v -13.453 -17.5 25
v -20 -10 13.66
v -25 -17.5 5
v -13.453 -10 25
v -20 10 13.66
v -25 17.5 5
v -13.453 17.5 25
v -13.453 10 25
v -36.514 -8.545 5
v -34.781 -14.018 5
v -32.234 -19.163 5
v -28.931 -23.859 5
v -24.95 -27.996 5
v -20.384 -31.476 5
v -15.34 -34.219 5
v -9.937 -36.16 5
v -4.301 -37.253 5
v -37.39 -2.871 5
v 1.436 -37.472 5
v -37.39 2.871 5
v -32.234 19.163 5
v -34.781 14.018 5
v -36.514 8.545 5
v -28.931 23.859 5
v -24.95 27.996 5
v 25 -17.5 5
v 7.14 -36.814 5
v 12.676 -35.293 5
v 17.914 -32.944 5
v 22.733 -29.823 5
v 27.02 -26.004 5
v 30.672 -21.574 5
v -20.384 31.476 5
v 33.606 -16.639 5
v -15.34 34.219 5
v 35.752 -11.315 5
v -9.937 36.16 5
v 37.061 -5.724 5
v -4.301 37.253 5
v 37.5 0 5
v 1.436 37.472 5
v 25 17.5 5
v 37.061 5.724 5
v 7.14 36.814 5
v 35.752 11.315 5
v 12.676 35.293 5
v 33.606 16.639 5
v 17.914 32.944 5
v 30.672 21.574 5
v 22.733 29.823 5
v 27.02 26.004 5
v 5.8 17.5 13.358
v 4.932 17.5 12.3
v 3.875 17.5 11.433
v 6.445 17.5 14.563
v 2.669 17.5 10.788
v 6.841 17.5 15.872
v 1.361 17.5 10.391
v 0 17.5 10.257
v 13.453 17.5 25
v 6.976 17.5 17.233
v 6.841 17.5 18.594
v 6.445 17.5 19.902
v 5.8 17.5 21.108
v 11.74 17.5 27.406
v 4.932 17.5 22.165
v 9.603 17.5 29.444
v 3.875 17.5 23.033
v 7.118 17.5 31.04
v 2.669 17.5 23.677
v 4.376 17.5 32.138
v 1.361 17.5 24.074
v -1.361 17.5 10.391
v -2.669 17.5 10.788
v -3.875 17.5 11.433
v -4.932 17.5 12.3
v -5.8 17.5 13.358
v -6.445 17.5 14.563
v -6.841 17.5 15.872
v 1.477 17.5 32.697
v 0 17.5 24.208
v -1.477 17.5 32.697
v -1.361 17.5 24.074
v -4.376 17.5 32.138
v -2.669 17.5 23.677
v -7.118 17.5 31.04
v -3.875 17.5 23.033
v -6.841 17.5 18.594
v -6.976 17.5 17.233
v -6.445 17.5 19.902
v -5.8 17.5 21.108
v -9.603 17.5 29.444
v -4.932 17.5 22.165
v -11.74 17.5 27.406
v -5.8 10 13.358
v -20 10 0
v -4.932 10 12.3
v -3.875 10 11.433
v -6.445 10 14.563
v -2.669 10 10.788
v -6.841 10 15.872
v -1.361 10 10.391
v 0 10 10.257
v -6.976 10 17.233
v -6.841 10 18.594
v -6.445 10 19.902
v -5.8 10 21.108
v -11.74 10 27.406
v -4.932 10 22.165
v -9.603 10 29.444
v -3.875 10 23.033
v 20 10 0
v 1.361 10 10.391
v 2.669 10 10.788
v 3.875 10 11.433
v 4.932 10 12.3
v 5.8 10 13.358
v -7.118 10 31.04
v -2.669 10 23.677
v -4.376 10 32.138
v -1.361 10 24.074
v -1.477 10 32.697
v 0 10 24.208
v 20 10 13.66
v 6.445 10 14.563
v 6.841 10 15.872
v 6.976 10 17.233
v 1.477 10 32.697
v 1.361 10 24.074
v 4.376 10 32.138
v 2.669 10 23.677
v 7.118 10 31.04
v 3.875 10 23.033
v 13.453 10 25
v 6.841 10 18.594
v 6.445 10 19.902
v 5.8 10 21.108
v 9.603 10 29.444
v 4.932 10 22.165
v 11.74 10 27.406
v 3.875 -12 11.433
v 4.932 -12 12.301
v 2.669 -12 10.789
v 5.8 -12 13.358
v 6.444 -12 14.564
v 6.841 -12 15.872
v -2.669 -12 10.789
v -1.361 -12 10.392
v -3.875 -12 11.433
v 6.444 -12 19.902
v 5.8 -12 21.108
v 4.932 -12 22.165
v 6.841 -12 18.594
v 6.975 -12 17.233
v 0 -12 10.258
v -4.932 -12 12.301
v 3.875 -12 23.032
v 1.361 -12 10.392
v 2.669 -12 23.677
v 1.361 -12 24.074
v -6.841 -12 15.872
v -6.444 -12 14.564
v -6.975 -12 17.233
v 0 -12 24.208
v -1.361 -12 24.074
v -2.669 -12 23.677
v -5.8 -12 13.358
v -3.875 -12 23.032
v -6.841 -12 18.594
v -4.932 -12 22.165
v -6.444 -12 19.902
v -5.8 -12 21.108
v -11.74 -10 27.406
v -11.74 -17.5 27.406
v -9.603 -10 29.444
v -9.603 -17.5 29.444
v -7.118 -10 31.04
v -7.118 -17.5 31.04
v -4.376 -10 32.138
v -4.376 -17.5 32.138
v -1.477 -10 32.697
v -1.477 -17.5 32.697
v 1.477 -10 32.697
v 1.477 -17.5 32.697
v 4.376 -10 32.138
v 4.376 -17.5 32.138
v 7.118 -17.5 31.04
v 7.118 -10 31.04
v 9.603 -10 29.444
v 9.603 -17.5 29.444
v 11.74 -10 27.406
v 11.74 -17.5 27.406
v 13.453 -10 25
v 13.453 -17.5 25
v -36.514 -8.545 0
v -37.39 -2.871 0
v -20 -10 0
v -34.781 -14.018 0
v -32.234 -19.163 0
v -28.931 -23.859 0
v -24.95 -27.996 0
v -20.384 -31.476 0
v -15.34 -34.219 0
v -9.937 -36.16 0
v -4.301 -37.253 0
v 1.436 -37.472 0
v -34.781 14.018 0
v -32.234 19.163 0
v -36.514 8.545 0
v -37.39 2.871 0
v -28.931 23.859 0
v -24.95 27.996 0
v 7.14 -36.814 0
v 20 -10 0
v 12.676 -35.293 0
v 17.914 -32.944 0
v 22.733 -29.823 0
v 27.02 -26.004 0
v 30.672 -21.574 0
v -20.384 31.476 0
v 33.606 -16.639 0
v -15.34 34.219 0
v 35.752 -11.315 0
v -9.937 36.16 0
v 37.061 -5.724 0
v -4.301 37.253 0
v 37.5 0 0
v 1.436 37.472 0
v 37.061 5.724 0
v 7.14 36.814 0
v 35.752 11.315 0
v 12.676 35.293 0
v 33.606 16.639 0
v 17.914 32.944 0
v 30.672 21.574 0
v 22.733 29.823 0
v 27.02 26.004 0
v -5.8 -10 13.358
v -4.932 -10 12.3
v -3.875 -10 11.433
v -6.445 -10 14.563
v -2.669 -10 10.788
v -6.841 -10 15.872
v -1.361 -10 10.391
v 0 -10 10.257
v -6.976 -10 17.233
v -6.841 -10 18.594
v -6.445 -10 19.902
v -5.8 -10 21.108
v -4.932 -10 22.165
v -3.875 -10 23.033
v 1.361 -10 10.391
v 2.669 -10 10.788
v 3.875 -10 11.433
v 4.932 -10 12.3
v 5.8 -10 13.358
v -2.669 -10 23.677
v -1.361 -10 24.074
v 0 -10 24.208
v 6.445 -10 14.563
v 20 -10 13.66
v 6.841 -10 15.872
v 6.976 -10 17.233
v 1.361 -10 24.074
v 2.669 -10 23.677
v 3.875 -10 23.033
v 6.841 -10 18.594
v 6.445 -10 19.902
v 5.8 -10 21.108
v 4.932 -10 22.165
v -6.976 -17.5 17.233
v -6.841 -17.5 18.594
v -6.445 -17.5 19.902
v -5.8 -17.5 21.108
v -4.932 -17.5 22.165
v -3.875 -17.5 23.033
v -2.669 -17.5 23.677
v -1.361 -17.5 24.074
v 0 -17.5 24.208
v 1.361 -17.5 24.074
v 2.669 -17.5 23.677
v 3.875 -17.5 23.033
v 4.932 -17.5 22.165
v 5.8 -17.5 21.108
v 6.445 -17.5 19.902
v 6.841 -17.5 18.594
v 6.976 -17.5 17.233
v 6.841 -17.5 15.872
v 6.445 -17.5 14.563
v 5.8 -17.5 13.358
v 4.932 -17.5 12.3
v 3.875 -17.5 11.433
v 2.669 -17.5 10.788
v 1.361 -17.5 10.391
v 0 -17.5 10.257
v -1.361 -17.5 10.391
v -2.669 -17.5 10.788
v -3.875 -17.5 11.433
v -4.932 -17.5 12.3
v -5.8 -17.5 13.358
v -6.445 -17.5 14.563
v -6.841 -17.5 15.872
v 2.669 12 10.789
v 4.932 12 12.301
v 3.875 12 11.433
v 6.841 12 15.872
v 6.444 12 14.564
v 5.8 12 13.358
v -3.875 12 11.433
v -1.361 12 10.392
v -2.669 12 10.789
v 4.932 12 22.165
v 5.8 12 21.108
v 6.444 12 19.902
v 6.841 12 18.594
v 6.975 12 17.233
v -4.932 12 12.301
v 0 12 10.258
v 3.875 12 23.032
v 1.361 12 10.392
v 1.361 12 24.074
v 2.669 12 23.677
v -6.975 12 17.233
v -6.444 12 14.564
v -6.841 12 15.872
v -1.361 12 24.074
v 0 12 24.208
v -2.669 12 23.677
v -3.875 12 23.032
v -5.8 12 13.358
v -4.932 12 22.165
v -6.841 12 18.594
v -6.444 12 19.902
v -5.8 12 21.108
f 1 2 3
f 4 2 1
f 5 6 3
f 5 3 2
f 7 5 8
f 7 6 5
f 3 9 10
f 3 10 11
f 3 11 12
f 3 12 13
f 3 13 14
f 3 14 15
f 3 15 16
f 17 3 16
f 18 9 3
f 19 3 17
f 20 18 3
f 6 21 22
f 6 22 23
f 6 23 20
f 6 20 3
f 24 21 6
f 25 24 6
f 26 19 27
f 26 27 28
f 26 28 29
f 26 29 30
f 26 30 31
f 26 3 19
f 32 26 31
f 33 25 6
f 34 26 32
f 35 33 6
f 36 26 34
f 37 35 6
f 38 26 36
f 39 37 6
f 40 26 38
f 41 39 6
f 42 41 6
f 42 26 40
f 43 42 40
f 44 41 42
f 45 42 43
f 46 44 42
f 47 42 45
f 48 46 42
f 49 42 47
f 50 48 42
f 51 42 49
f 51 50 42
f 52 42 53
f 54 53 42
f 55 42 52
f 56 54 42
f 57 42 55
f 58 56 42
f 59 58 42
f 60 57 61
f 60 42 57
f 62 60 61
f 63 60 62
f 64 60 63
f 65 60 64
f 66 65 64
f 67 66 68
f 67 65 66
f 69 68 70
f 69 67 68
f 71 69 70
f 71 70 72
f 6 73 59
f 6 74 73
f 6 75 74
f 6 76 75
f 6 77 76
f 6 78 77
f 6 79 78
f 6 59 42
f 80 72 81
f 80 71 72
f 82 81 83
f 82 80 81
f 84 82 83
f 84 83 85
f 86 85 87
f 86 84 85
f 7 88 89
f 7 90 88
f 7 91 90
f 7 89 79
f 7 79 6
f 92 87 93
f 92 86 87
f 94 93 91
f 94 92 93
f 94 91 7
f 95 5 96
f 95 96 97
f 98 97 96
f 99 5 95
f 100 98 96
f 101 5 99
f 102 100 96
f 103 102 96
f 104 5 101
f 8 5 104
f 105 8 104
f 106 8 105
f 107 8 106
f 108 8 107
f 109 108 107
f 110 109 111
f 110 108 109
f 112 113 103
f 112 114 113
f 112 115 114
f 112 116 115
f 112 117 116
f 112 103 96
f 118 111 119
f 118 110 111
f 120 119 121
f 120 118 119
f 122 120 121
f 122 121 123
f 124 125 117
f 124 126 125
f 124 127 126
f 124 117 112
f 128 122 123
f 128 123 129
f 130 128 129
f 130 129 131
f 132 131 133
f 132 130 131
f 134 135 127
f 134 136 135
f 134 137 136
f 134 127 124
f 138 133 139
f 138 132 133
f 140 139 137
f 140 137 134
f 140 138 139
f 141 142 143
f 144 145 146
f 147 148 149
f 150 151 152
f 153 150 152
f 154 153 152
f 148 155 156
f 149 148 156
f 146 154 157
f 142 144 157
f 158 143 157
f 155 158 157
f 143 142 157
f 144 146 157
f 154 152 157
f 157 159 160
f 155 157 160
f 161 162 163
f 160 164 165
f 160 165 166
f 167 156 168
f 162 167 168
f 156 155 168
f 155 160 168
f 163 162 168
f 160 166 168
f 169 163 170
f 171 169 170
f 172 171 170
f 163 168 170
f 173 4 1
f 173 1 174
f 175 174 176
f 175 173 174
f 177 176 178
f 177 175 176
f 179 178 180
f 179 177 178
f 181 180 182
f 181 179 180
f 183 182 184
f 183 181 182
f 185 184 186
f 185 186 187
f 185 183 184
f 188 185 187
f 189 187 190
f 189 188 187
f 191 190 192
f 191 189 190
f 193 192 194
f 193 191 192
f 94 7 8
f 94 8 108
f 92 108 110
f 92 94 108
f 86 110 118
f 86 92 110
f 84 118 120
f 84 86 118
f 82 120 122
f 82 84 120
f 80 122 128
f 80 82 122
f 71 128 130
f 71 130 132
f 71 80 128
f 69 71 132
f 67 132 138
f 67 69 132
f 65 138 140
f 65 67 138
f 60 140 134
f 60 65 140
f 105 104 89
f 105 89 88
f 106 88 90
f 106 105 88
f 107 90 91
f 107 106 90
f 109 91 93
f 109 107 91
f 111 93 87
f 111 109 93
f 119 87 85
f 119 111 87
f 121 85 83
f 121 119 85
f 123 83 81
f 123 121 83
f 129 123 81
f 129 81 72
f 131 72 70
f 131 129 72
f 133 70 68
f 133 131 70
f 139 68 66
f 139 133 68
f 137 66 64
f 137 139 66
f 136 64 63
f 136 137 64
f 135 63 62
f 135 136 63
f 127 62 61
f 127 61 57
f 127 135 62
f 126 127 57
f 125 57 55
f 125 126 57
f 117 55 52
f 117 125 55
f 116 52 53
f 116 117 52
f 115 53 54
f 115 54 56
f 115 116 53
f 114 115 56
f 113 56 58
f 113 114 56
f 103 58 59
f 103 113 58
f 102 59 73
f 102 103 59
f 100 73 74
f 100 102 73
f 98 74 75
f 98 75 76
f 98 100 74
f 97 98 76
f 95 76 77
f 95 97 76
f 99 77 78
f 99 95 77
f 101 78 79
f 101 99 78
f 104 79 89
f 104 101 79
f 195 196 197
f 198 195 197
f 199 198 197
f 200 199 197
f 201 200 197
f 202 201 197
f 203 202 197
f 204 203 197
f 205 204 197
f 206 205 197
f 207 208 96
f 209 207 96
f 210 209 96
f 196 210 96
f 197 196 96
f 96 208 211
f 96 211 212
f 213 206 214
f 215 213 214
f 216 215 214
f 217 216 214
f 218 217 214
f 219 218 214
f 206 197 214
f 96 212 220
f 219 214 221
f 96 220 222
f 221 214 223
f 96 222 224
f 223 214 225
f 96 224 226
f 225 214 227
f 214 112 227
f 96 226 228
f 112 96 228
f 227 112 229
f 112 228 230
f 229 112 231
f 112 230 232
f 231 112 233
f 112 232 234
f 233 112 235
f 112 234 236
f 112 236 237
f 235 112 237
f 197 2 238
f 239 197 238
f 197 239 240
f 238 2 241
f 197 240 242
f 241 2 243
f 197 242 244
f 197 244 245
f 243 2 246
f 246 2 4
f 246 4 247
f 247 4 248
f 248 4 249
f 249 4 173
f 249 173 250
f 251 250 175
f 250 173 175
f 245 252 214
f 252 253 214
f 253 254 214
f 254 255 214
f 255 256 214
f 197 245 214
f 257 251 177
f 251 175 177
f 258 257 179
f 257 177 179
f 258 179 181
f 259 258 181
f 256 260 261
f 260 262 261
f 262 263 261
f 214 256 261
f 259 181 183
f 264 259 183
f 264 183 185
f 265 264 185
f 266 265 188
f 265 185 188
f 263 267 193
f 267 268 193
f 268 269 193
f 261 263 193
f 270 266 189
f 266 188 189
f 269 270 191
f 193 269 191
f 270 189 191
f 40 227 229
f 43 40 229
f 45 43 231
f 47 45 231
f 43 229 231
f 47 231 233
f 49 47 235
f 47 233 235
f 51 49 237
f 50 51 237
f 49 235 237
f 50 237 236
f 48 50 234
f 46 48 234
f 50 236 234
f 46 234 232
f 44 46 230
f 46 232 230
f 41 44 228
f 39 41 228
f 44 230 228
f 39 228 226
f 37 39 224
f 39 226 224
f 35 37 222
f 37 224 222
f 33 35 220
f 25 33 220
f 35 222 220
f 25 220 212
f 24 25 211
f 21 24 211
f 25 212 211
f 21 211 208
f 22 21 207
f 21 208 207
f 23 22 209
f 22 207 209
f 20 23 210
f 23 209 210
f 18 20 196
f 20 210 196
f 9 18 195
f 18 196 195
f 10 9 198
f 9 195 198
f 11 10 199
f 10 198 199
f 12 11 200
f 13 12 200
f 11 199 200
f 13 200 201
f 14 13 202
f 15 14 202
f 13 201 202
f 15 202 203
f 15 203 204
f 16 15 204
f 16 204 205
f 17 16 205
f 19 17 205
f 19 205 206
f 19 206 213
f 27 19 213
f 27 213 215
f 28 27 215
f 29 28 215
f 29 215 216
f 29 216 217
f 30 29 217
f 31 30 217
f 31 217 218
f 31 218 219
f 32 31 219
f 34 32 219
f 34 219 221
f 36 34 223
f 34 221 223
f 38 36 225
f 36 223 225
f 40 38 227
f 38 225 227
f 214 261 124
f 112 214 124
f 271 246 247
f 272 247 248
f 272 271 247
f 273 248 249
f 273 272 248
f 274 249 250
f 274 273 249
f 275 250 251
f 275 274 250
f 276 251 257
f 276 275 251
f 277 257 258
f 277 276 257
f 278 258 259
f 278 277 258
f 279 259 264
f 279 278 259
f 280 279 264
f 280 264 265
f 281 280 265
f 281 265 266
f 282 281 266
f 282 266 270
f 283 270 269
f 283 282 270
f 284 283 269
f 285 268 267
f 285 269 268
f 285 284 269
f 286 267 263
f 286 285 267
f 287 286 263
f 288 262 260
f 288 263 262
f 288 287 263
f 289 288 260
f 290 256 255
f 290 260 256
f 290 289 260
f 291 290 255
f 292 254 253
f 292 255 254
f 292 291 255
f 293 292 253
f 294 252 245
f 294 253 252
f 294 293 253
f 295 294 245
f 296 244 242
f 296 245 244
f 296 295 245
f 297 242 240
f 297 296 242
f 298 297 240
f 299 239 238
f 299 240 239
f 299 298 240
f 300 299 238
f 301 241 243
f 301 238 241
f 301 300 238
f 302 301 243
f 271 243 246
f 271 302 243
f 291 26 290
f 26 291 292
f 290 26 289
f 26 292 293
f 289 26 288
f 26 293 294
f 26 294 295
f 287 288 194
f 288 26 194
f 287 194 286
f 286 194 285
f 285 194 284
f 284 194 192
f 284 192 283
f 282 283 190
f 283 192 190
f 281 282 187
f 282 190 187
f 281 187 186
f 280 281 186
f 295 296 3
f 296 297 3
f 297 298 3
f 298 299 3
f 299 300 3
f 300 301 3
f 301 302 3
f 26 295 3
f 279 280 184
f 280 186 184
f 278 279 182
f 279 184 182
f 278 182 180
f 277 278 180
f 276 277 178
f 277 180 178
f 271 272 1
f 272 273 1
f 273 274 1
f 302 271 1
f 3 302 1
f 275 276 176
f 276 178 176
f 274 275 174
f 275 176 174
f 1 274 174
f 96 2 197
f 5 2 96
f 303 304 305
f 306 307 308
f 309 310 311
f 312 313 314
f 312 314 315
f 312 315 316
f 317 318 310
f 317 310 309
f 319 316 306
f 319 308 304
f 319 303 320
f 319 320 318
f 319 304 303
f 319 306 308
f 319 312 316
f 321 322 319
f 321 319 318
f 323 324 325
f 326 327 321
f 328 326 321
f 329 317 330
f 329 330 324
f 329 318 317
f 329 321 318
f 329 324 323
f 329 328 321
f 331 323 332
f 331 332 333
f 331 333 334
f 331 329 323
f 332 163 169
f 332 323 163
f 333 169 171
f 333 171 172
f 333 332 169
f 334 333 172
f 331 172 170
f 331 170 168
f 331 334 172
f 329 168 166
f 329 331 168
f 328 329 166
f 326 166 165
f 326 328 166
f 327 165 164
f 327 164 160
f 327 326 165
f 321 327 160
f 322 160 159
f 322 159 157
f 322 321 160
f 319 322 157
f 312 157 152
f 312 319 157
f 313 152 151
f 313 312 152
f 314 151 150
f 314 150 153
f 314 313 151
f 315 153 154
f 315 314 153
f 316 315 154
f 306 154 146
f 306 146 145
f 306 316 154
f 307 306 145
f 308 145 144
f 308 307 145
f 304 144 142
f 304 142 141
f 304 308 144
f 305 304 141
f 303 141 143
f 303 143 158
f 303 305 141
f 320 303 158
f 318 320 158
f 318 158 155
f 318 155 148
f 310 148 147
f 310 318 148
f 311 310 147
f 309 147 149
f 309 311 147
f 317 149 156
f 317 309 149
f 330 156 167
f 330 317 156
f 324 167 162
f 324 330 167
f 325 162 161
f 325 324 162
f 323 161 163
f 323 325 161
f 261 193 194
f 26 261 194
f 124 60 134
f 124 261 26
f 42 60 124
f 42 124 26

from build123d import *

# Parameters (mm, degrees)
SKETCH2_R               = 37.5
EXTRUDE1_DEPTH          = 5
SKETCH4_R               = 6.975515666
EXTRUDE2_DEPTH          = 17.5
SKETCH5_W               = 40
SKETCH5_H               = 20
CUT_EXTRUDE3_DEPTH      = 28.767090063
CUT_EXTRUDE3_DEPTH_BACK = 6
SKETCH6_R               = 6.975
EXTRUDE3_DEPTH          = 22
EXTRUDE3_DEPTH_BACK     = 2


with BuildPart() as part:
    # Sketch2 → Extrude1 (new body)
    with BuildSketch(Plane.XY):
        Circle(SKETCH2_R)
    extrude(amount=EXTRUDE1_DEPTH)

    # Sketch4 → Extrude2 (add, symmetric)
    with BuildSketch(Plane(origin=(0, 0, 0), x_dir=(-1, 0, 0), z_dir=(0, 1, 0))):
        with BuildLine():
            Line((-25, 5), (25, 5))
            Line((25, 5), (13.452994616, 25))
            ThreePointArc((13.452994616, 25), (0, 32.767090063), (-13.452994616, 25))
            Line((-13.452994616, 25), (-25, 5))
        make_face()
        with Locations((0, 17.232909937)):
            Circle(SKETCH4_R, mode=Mode.SUBTRACT)
    extrude(amount=EXTRUDE2_DEPTH, both=True)

    # Sketch5 → Cut-Extrude3 (cut, two sides)
    with BuildSketch(Plane.XY.offset(5)) as cut_extrude3_sk:
        Rectangle(SKETCH5_W, SKETCH5_H)
    extrude(amount=CUT_EXTRUDE3_DEPTH, mode=Mode.SUBTRACT)
    extrude(cut_extrude3_sk.sketch, amount=-CUT_EXTRUDE3_DEPTH_BACK, mode=Mode.SUBTRACT)


with BuildPart() as body_2:
    # Sketch6 → Extrude3 (new body, two sides)
    with BuildSketch(Plane(origin=(0, -10, 0), x_dir=(-1, 0, 0), z_dir=(0, 1, 0))) as extrude3_sk:
        with Locations((0, 17.232909937)):
            Circle(SKETCH6_R)
    extrude(amount=EXTRUDE3_DEPTH)
    extrude(extrude3_sk.sketch, amount=-EXTRUDE3_DEPTH_BACK)


solid = Compound([part.part, body_2.part])
